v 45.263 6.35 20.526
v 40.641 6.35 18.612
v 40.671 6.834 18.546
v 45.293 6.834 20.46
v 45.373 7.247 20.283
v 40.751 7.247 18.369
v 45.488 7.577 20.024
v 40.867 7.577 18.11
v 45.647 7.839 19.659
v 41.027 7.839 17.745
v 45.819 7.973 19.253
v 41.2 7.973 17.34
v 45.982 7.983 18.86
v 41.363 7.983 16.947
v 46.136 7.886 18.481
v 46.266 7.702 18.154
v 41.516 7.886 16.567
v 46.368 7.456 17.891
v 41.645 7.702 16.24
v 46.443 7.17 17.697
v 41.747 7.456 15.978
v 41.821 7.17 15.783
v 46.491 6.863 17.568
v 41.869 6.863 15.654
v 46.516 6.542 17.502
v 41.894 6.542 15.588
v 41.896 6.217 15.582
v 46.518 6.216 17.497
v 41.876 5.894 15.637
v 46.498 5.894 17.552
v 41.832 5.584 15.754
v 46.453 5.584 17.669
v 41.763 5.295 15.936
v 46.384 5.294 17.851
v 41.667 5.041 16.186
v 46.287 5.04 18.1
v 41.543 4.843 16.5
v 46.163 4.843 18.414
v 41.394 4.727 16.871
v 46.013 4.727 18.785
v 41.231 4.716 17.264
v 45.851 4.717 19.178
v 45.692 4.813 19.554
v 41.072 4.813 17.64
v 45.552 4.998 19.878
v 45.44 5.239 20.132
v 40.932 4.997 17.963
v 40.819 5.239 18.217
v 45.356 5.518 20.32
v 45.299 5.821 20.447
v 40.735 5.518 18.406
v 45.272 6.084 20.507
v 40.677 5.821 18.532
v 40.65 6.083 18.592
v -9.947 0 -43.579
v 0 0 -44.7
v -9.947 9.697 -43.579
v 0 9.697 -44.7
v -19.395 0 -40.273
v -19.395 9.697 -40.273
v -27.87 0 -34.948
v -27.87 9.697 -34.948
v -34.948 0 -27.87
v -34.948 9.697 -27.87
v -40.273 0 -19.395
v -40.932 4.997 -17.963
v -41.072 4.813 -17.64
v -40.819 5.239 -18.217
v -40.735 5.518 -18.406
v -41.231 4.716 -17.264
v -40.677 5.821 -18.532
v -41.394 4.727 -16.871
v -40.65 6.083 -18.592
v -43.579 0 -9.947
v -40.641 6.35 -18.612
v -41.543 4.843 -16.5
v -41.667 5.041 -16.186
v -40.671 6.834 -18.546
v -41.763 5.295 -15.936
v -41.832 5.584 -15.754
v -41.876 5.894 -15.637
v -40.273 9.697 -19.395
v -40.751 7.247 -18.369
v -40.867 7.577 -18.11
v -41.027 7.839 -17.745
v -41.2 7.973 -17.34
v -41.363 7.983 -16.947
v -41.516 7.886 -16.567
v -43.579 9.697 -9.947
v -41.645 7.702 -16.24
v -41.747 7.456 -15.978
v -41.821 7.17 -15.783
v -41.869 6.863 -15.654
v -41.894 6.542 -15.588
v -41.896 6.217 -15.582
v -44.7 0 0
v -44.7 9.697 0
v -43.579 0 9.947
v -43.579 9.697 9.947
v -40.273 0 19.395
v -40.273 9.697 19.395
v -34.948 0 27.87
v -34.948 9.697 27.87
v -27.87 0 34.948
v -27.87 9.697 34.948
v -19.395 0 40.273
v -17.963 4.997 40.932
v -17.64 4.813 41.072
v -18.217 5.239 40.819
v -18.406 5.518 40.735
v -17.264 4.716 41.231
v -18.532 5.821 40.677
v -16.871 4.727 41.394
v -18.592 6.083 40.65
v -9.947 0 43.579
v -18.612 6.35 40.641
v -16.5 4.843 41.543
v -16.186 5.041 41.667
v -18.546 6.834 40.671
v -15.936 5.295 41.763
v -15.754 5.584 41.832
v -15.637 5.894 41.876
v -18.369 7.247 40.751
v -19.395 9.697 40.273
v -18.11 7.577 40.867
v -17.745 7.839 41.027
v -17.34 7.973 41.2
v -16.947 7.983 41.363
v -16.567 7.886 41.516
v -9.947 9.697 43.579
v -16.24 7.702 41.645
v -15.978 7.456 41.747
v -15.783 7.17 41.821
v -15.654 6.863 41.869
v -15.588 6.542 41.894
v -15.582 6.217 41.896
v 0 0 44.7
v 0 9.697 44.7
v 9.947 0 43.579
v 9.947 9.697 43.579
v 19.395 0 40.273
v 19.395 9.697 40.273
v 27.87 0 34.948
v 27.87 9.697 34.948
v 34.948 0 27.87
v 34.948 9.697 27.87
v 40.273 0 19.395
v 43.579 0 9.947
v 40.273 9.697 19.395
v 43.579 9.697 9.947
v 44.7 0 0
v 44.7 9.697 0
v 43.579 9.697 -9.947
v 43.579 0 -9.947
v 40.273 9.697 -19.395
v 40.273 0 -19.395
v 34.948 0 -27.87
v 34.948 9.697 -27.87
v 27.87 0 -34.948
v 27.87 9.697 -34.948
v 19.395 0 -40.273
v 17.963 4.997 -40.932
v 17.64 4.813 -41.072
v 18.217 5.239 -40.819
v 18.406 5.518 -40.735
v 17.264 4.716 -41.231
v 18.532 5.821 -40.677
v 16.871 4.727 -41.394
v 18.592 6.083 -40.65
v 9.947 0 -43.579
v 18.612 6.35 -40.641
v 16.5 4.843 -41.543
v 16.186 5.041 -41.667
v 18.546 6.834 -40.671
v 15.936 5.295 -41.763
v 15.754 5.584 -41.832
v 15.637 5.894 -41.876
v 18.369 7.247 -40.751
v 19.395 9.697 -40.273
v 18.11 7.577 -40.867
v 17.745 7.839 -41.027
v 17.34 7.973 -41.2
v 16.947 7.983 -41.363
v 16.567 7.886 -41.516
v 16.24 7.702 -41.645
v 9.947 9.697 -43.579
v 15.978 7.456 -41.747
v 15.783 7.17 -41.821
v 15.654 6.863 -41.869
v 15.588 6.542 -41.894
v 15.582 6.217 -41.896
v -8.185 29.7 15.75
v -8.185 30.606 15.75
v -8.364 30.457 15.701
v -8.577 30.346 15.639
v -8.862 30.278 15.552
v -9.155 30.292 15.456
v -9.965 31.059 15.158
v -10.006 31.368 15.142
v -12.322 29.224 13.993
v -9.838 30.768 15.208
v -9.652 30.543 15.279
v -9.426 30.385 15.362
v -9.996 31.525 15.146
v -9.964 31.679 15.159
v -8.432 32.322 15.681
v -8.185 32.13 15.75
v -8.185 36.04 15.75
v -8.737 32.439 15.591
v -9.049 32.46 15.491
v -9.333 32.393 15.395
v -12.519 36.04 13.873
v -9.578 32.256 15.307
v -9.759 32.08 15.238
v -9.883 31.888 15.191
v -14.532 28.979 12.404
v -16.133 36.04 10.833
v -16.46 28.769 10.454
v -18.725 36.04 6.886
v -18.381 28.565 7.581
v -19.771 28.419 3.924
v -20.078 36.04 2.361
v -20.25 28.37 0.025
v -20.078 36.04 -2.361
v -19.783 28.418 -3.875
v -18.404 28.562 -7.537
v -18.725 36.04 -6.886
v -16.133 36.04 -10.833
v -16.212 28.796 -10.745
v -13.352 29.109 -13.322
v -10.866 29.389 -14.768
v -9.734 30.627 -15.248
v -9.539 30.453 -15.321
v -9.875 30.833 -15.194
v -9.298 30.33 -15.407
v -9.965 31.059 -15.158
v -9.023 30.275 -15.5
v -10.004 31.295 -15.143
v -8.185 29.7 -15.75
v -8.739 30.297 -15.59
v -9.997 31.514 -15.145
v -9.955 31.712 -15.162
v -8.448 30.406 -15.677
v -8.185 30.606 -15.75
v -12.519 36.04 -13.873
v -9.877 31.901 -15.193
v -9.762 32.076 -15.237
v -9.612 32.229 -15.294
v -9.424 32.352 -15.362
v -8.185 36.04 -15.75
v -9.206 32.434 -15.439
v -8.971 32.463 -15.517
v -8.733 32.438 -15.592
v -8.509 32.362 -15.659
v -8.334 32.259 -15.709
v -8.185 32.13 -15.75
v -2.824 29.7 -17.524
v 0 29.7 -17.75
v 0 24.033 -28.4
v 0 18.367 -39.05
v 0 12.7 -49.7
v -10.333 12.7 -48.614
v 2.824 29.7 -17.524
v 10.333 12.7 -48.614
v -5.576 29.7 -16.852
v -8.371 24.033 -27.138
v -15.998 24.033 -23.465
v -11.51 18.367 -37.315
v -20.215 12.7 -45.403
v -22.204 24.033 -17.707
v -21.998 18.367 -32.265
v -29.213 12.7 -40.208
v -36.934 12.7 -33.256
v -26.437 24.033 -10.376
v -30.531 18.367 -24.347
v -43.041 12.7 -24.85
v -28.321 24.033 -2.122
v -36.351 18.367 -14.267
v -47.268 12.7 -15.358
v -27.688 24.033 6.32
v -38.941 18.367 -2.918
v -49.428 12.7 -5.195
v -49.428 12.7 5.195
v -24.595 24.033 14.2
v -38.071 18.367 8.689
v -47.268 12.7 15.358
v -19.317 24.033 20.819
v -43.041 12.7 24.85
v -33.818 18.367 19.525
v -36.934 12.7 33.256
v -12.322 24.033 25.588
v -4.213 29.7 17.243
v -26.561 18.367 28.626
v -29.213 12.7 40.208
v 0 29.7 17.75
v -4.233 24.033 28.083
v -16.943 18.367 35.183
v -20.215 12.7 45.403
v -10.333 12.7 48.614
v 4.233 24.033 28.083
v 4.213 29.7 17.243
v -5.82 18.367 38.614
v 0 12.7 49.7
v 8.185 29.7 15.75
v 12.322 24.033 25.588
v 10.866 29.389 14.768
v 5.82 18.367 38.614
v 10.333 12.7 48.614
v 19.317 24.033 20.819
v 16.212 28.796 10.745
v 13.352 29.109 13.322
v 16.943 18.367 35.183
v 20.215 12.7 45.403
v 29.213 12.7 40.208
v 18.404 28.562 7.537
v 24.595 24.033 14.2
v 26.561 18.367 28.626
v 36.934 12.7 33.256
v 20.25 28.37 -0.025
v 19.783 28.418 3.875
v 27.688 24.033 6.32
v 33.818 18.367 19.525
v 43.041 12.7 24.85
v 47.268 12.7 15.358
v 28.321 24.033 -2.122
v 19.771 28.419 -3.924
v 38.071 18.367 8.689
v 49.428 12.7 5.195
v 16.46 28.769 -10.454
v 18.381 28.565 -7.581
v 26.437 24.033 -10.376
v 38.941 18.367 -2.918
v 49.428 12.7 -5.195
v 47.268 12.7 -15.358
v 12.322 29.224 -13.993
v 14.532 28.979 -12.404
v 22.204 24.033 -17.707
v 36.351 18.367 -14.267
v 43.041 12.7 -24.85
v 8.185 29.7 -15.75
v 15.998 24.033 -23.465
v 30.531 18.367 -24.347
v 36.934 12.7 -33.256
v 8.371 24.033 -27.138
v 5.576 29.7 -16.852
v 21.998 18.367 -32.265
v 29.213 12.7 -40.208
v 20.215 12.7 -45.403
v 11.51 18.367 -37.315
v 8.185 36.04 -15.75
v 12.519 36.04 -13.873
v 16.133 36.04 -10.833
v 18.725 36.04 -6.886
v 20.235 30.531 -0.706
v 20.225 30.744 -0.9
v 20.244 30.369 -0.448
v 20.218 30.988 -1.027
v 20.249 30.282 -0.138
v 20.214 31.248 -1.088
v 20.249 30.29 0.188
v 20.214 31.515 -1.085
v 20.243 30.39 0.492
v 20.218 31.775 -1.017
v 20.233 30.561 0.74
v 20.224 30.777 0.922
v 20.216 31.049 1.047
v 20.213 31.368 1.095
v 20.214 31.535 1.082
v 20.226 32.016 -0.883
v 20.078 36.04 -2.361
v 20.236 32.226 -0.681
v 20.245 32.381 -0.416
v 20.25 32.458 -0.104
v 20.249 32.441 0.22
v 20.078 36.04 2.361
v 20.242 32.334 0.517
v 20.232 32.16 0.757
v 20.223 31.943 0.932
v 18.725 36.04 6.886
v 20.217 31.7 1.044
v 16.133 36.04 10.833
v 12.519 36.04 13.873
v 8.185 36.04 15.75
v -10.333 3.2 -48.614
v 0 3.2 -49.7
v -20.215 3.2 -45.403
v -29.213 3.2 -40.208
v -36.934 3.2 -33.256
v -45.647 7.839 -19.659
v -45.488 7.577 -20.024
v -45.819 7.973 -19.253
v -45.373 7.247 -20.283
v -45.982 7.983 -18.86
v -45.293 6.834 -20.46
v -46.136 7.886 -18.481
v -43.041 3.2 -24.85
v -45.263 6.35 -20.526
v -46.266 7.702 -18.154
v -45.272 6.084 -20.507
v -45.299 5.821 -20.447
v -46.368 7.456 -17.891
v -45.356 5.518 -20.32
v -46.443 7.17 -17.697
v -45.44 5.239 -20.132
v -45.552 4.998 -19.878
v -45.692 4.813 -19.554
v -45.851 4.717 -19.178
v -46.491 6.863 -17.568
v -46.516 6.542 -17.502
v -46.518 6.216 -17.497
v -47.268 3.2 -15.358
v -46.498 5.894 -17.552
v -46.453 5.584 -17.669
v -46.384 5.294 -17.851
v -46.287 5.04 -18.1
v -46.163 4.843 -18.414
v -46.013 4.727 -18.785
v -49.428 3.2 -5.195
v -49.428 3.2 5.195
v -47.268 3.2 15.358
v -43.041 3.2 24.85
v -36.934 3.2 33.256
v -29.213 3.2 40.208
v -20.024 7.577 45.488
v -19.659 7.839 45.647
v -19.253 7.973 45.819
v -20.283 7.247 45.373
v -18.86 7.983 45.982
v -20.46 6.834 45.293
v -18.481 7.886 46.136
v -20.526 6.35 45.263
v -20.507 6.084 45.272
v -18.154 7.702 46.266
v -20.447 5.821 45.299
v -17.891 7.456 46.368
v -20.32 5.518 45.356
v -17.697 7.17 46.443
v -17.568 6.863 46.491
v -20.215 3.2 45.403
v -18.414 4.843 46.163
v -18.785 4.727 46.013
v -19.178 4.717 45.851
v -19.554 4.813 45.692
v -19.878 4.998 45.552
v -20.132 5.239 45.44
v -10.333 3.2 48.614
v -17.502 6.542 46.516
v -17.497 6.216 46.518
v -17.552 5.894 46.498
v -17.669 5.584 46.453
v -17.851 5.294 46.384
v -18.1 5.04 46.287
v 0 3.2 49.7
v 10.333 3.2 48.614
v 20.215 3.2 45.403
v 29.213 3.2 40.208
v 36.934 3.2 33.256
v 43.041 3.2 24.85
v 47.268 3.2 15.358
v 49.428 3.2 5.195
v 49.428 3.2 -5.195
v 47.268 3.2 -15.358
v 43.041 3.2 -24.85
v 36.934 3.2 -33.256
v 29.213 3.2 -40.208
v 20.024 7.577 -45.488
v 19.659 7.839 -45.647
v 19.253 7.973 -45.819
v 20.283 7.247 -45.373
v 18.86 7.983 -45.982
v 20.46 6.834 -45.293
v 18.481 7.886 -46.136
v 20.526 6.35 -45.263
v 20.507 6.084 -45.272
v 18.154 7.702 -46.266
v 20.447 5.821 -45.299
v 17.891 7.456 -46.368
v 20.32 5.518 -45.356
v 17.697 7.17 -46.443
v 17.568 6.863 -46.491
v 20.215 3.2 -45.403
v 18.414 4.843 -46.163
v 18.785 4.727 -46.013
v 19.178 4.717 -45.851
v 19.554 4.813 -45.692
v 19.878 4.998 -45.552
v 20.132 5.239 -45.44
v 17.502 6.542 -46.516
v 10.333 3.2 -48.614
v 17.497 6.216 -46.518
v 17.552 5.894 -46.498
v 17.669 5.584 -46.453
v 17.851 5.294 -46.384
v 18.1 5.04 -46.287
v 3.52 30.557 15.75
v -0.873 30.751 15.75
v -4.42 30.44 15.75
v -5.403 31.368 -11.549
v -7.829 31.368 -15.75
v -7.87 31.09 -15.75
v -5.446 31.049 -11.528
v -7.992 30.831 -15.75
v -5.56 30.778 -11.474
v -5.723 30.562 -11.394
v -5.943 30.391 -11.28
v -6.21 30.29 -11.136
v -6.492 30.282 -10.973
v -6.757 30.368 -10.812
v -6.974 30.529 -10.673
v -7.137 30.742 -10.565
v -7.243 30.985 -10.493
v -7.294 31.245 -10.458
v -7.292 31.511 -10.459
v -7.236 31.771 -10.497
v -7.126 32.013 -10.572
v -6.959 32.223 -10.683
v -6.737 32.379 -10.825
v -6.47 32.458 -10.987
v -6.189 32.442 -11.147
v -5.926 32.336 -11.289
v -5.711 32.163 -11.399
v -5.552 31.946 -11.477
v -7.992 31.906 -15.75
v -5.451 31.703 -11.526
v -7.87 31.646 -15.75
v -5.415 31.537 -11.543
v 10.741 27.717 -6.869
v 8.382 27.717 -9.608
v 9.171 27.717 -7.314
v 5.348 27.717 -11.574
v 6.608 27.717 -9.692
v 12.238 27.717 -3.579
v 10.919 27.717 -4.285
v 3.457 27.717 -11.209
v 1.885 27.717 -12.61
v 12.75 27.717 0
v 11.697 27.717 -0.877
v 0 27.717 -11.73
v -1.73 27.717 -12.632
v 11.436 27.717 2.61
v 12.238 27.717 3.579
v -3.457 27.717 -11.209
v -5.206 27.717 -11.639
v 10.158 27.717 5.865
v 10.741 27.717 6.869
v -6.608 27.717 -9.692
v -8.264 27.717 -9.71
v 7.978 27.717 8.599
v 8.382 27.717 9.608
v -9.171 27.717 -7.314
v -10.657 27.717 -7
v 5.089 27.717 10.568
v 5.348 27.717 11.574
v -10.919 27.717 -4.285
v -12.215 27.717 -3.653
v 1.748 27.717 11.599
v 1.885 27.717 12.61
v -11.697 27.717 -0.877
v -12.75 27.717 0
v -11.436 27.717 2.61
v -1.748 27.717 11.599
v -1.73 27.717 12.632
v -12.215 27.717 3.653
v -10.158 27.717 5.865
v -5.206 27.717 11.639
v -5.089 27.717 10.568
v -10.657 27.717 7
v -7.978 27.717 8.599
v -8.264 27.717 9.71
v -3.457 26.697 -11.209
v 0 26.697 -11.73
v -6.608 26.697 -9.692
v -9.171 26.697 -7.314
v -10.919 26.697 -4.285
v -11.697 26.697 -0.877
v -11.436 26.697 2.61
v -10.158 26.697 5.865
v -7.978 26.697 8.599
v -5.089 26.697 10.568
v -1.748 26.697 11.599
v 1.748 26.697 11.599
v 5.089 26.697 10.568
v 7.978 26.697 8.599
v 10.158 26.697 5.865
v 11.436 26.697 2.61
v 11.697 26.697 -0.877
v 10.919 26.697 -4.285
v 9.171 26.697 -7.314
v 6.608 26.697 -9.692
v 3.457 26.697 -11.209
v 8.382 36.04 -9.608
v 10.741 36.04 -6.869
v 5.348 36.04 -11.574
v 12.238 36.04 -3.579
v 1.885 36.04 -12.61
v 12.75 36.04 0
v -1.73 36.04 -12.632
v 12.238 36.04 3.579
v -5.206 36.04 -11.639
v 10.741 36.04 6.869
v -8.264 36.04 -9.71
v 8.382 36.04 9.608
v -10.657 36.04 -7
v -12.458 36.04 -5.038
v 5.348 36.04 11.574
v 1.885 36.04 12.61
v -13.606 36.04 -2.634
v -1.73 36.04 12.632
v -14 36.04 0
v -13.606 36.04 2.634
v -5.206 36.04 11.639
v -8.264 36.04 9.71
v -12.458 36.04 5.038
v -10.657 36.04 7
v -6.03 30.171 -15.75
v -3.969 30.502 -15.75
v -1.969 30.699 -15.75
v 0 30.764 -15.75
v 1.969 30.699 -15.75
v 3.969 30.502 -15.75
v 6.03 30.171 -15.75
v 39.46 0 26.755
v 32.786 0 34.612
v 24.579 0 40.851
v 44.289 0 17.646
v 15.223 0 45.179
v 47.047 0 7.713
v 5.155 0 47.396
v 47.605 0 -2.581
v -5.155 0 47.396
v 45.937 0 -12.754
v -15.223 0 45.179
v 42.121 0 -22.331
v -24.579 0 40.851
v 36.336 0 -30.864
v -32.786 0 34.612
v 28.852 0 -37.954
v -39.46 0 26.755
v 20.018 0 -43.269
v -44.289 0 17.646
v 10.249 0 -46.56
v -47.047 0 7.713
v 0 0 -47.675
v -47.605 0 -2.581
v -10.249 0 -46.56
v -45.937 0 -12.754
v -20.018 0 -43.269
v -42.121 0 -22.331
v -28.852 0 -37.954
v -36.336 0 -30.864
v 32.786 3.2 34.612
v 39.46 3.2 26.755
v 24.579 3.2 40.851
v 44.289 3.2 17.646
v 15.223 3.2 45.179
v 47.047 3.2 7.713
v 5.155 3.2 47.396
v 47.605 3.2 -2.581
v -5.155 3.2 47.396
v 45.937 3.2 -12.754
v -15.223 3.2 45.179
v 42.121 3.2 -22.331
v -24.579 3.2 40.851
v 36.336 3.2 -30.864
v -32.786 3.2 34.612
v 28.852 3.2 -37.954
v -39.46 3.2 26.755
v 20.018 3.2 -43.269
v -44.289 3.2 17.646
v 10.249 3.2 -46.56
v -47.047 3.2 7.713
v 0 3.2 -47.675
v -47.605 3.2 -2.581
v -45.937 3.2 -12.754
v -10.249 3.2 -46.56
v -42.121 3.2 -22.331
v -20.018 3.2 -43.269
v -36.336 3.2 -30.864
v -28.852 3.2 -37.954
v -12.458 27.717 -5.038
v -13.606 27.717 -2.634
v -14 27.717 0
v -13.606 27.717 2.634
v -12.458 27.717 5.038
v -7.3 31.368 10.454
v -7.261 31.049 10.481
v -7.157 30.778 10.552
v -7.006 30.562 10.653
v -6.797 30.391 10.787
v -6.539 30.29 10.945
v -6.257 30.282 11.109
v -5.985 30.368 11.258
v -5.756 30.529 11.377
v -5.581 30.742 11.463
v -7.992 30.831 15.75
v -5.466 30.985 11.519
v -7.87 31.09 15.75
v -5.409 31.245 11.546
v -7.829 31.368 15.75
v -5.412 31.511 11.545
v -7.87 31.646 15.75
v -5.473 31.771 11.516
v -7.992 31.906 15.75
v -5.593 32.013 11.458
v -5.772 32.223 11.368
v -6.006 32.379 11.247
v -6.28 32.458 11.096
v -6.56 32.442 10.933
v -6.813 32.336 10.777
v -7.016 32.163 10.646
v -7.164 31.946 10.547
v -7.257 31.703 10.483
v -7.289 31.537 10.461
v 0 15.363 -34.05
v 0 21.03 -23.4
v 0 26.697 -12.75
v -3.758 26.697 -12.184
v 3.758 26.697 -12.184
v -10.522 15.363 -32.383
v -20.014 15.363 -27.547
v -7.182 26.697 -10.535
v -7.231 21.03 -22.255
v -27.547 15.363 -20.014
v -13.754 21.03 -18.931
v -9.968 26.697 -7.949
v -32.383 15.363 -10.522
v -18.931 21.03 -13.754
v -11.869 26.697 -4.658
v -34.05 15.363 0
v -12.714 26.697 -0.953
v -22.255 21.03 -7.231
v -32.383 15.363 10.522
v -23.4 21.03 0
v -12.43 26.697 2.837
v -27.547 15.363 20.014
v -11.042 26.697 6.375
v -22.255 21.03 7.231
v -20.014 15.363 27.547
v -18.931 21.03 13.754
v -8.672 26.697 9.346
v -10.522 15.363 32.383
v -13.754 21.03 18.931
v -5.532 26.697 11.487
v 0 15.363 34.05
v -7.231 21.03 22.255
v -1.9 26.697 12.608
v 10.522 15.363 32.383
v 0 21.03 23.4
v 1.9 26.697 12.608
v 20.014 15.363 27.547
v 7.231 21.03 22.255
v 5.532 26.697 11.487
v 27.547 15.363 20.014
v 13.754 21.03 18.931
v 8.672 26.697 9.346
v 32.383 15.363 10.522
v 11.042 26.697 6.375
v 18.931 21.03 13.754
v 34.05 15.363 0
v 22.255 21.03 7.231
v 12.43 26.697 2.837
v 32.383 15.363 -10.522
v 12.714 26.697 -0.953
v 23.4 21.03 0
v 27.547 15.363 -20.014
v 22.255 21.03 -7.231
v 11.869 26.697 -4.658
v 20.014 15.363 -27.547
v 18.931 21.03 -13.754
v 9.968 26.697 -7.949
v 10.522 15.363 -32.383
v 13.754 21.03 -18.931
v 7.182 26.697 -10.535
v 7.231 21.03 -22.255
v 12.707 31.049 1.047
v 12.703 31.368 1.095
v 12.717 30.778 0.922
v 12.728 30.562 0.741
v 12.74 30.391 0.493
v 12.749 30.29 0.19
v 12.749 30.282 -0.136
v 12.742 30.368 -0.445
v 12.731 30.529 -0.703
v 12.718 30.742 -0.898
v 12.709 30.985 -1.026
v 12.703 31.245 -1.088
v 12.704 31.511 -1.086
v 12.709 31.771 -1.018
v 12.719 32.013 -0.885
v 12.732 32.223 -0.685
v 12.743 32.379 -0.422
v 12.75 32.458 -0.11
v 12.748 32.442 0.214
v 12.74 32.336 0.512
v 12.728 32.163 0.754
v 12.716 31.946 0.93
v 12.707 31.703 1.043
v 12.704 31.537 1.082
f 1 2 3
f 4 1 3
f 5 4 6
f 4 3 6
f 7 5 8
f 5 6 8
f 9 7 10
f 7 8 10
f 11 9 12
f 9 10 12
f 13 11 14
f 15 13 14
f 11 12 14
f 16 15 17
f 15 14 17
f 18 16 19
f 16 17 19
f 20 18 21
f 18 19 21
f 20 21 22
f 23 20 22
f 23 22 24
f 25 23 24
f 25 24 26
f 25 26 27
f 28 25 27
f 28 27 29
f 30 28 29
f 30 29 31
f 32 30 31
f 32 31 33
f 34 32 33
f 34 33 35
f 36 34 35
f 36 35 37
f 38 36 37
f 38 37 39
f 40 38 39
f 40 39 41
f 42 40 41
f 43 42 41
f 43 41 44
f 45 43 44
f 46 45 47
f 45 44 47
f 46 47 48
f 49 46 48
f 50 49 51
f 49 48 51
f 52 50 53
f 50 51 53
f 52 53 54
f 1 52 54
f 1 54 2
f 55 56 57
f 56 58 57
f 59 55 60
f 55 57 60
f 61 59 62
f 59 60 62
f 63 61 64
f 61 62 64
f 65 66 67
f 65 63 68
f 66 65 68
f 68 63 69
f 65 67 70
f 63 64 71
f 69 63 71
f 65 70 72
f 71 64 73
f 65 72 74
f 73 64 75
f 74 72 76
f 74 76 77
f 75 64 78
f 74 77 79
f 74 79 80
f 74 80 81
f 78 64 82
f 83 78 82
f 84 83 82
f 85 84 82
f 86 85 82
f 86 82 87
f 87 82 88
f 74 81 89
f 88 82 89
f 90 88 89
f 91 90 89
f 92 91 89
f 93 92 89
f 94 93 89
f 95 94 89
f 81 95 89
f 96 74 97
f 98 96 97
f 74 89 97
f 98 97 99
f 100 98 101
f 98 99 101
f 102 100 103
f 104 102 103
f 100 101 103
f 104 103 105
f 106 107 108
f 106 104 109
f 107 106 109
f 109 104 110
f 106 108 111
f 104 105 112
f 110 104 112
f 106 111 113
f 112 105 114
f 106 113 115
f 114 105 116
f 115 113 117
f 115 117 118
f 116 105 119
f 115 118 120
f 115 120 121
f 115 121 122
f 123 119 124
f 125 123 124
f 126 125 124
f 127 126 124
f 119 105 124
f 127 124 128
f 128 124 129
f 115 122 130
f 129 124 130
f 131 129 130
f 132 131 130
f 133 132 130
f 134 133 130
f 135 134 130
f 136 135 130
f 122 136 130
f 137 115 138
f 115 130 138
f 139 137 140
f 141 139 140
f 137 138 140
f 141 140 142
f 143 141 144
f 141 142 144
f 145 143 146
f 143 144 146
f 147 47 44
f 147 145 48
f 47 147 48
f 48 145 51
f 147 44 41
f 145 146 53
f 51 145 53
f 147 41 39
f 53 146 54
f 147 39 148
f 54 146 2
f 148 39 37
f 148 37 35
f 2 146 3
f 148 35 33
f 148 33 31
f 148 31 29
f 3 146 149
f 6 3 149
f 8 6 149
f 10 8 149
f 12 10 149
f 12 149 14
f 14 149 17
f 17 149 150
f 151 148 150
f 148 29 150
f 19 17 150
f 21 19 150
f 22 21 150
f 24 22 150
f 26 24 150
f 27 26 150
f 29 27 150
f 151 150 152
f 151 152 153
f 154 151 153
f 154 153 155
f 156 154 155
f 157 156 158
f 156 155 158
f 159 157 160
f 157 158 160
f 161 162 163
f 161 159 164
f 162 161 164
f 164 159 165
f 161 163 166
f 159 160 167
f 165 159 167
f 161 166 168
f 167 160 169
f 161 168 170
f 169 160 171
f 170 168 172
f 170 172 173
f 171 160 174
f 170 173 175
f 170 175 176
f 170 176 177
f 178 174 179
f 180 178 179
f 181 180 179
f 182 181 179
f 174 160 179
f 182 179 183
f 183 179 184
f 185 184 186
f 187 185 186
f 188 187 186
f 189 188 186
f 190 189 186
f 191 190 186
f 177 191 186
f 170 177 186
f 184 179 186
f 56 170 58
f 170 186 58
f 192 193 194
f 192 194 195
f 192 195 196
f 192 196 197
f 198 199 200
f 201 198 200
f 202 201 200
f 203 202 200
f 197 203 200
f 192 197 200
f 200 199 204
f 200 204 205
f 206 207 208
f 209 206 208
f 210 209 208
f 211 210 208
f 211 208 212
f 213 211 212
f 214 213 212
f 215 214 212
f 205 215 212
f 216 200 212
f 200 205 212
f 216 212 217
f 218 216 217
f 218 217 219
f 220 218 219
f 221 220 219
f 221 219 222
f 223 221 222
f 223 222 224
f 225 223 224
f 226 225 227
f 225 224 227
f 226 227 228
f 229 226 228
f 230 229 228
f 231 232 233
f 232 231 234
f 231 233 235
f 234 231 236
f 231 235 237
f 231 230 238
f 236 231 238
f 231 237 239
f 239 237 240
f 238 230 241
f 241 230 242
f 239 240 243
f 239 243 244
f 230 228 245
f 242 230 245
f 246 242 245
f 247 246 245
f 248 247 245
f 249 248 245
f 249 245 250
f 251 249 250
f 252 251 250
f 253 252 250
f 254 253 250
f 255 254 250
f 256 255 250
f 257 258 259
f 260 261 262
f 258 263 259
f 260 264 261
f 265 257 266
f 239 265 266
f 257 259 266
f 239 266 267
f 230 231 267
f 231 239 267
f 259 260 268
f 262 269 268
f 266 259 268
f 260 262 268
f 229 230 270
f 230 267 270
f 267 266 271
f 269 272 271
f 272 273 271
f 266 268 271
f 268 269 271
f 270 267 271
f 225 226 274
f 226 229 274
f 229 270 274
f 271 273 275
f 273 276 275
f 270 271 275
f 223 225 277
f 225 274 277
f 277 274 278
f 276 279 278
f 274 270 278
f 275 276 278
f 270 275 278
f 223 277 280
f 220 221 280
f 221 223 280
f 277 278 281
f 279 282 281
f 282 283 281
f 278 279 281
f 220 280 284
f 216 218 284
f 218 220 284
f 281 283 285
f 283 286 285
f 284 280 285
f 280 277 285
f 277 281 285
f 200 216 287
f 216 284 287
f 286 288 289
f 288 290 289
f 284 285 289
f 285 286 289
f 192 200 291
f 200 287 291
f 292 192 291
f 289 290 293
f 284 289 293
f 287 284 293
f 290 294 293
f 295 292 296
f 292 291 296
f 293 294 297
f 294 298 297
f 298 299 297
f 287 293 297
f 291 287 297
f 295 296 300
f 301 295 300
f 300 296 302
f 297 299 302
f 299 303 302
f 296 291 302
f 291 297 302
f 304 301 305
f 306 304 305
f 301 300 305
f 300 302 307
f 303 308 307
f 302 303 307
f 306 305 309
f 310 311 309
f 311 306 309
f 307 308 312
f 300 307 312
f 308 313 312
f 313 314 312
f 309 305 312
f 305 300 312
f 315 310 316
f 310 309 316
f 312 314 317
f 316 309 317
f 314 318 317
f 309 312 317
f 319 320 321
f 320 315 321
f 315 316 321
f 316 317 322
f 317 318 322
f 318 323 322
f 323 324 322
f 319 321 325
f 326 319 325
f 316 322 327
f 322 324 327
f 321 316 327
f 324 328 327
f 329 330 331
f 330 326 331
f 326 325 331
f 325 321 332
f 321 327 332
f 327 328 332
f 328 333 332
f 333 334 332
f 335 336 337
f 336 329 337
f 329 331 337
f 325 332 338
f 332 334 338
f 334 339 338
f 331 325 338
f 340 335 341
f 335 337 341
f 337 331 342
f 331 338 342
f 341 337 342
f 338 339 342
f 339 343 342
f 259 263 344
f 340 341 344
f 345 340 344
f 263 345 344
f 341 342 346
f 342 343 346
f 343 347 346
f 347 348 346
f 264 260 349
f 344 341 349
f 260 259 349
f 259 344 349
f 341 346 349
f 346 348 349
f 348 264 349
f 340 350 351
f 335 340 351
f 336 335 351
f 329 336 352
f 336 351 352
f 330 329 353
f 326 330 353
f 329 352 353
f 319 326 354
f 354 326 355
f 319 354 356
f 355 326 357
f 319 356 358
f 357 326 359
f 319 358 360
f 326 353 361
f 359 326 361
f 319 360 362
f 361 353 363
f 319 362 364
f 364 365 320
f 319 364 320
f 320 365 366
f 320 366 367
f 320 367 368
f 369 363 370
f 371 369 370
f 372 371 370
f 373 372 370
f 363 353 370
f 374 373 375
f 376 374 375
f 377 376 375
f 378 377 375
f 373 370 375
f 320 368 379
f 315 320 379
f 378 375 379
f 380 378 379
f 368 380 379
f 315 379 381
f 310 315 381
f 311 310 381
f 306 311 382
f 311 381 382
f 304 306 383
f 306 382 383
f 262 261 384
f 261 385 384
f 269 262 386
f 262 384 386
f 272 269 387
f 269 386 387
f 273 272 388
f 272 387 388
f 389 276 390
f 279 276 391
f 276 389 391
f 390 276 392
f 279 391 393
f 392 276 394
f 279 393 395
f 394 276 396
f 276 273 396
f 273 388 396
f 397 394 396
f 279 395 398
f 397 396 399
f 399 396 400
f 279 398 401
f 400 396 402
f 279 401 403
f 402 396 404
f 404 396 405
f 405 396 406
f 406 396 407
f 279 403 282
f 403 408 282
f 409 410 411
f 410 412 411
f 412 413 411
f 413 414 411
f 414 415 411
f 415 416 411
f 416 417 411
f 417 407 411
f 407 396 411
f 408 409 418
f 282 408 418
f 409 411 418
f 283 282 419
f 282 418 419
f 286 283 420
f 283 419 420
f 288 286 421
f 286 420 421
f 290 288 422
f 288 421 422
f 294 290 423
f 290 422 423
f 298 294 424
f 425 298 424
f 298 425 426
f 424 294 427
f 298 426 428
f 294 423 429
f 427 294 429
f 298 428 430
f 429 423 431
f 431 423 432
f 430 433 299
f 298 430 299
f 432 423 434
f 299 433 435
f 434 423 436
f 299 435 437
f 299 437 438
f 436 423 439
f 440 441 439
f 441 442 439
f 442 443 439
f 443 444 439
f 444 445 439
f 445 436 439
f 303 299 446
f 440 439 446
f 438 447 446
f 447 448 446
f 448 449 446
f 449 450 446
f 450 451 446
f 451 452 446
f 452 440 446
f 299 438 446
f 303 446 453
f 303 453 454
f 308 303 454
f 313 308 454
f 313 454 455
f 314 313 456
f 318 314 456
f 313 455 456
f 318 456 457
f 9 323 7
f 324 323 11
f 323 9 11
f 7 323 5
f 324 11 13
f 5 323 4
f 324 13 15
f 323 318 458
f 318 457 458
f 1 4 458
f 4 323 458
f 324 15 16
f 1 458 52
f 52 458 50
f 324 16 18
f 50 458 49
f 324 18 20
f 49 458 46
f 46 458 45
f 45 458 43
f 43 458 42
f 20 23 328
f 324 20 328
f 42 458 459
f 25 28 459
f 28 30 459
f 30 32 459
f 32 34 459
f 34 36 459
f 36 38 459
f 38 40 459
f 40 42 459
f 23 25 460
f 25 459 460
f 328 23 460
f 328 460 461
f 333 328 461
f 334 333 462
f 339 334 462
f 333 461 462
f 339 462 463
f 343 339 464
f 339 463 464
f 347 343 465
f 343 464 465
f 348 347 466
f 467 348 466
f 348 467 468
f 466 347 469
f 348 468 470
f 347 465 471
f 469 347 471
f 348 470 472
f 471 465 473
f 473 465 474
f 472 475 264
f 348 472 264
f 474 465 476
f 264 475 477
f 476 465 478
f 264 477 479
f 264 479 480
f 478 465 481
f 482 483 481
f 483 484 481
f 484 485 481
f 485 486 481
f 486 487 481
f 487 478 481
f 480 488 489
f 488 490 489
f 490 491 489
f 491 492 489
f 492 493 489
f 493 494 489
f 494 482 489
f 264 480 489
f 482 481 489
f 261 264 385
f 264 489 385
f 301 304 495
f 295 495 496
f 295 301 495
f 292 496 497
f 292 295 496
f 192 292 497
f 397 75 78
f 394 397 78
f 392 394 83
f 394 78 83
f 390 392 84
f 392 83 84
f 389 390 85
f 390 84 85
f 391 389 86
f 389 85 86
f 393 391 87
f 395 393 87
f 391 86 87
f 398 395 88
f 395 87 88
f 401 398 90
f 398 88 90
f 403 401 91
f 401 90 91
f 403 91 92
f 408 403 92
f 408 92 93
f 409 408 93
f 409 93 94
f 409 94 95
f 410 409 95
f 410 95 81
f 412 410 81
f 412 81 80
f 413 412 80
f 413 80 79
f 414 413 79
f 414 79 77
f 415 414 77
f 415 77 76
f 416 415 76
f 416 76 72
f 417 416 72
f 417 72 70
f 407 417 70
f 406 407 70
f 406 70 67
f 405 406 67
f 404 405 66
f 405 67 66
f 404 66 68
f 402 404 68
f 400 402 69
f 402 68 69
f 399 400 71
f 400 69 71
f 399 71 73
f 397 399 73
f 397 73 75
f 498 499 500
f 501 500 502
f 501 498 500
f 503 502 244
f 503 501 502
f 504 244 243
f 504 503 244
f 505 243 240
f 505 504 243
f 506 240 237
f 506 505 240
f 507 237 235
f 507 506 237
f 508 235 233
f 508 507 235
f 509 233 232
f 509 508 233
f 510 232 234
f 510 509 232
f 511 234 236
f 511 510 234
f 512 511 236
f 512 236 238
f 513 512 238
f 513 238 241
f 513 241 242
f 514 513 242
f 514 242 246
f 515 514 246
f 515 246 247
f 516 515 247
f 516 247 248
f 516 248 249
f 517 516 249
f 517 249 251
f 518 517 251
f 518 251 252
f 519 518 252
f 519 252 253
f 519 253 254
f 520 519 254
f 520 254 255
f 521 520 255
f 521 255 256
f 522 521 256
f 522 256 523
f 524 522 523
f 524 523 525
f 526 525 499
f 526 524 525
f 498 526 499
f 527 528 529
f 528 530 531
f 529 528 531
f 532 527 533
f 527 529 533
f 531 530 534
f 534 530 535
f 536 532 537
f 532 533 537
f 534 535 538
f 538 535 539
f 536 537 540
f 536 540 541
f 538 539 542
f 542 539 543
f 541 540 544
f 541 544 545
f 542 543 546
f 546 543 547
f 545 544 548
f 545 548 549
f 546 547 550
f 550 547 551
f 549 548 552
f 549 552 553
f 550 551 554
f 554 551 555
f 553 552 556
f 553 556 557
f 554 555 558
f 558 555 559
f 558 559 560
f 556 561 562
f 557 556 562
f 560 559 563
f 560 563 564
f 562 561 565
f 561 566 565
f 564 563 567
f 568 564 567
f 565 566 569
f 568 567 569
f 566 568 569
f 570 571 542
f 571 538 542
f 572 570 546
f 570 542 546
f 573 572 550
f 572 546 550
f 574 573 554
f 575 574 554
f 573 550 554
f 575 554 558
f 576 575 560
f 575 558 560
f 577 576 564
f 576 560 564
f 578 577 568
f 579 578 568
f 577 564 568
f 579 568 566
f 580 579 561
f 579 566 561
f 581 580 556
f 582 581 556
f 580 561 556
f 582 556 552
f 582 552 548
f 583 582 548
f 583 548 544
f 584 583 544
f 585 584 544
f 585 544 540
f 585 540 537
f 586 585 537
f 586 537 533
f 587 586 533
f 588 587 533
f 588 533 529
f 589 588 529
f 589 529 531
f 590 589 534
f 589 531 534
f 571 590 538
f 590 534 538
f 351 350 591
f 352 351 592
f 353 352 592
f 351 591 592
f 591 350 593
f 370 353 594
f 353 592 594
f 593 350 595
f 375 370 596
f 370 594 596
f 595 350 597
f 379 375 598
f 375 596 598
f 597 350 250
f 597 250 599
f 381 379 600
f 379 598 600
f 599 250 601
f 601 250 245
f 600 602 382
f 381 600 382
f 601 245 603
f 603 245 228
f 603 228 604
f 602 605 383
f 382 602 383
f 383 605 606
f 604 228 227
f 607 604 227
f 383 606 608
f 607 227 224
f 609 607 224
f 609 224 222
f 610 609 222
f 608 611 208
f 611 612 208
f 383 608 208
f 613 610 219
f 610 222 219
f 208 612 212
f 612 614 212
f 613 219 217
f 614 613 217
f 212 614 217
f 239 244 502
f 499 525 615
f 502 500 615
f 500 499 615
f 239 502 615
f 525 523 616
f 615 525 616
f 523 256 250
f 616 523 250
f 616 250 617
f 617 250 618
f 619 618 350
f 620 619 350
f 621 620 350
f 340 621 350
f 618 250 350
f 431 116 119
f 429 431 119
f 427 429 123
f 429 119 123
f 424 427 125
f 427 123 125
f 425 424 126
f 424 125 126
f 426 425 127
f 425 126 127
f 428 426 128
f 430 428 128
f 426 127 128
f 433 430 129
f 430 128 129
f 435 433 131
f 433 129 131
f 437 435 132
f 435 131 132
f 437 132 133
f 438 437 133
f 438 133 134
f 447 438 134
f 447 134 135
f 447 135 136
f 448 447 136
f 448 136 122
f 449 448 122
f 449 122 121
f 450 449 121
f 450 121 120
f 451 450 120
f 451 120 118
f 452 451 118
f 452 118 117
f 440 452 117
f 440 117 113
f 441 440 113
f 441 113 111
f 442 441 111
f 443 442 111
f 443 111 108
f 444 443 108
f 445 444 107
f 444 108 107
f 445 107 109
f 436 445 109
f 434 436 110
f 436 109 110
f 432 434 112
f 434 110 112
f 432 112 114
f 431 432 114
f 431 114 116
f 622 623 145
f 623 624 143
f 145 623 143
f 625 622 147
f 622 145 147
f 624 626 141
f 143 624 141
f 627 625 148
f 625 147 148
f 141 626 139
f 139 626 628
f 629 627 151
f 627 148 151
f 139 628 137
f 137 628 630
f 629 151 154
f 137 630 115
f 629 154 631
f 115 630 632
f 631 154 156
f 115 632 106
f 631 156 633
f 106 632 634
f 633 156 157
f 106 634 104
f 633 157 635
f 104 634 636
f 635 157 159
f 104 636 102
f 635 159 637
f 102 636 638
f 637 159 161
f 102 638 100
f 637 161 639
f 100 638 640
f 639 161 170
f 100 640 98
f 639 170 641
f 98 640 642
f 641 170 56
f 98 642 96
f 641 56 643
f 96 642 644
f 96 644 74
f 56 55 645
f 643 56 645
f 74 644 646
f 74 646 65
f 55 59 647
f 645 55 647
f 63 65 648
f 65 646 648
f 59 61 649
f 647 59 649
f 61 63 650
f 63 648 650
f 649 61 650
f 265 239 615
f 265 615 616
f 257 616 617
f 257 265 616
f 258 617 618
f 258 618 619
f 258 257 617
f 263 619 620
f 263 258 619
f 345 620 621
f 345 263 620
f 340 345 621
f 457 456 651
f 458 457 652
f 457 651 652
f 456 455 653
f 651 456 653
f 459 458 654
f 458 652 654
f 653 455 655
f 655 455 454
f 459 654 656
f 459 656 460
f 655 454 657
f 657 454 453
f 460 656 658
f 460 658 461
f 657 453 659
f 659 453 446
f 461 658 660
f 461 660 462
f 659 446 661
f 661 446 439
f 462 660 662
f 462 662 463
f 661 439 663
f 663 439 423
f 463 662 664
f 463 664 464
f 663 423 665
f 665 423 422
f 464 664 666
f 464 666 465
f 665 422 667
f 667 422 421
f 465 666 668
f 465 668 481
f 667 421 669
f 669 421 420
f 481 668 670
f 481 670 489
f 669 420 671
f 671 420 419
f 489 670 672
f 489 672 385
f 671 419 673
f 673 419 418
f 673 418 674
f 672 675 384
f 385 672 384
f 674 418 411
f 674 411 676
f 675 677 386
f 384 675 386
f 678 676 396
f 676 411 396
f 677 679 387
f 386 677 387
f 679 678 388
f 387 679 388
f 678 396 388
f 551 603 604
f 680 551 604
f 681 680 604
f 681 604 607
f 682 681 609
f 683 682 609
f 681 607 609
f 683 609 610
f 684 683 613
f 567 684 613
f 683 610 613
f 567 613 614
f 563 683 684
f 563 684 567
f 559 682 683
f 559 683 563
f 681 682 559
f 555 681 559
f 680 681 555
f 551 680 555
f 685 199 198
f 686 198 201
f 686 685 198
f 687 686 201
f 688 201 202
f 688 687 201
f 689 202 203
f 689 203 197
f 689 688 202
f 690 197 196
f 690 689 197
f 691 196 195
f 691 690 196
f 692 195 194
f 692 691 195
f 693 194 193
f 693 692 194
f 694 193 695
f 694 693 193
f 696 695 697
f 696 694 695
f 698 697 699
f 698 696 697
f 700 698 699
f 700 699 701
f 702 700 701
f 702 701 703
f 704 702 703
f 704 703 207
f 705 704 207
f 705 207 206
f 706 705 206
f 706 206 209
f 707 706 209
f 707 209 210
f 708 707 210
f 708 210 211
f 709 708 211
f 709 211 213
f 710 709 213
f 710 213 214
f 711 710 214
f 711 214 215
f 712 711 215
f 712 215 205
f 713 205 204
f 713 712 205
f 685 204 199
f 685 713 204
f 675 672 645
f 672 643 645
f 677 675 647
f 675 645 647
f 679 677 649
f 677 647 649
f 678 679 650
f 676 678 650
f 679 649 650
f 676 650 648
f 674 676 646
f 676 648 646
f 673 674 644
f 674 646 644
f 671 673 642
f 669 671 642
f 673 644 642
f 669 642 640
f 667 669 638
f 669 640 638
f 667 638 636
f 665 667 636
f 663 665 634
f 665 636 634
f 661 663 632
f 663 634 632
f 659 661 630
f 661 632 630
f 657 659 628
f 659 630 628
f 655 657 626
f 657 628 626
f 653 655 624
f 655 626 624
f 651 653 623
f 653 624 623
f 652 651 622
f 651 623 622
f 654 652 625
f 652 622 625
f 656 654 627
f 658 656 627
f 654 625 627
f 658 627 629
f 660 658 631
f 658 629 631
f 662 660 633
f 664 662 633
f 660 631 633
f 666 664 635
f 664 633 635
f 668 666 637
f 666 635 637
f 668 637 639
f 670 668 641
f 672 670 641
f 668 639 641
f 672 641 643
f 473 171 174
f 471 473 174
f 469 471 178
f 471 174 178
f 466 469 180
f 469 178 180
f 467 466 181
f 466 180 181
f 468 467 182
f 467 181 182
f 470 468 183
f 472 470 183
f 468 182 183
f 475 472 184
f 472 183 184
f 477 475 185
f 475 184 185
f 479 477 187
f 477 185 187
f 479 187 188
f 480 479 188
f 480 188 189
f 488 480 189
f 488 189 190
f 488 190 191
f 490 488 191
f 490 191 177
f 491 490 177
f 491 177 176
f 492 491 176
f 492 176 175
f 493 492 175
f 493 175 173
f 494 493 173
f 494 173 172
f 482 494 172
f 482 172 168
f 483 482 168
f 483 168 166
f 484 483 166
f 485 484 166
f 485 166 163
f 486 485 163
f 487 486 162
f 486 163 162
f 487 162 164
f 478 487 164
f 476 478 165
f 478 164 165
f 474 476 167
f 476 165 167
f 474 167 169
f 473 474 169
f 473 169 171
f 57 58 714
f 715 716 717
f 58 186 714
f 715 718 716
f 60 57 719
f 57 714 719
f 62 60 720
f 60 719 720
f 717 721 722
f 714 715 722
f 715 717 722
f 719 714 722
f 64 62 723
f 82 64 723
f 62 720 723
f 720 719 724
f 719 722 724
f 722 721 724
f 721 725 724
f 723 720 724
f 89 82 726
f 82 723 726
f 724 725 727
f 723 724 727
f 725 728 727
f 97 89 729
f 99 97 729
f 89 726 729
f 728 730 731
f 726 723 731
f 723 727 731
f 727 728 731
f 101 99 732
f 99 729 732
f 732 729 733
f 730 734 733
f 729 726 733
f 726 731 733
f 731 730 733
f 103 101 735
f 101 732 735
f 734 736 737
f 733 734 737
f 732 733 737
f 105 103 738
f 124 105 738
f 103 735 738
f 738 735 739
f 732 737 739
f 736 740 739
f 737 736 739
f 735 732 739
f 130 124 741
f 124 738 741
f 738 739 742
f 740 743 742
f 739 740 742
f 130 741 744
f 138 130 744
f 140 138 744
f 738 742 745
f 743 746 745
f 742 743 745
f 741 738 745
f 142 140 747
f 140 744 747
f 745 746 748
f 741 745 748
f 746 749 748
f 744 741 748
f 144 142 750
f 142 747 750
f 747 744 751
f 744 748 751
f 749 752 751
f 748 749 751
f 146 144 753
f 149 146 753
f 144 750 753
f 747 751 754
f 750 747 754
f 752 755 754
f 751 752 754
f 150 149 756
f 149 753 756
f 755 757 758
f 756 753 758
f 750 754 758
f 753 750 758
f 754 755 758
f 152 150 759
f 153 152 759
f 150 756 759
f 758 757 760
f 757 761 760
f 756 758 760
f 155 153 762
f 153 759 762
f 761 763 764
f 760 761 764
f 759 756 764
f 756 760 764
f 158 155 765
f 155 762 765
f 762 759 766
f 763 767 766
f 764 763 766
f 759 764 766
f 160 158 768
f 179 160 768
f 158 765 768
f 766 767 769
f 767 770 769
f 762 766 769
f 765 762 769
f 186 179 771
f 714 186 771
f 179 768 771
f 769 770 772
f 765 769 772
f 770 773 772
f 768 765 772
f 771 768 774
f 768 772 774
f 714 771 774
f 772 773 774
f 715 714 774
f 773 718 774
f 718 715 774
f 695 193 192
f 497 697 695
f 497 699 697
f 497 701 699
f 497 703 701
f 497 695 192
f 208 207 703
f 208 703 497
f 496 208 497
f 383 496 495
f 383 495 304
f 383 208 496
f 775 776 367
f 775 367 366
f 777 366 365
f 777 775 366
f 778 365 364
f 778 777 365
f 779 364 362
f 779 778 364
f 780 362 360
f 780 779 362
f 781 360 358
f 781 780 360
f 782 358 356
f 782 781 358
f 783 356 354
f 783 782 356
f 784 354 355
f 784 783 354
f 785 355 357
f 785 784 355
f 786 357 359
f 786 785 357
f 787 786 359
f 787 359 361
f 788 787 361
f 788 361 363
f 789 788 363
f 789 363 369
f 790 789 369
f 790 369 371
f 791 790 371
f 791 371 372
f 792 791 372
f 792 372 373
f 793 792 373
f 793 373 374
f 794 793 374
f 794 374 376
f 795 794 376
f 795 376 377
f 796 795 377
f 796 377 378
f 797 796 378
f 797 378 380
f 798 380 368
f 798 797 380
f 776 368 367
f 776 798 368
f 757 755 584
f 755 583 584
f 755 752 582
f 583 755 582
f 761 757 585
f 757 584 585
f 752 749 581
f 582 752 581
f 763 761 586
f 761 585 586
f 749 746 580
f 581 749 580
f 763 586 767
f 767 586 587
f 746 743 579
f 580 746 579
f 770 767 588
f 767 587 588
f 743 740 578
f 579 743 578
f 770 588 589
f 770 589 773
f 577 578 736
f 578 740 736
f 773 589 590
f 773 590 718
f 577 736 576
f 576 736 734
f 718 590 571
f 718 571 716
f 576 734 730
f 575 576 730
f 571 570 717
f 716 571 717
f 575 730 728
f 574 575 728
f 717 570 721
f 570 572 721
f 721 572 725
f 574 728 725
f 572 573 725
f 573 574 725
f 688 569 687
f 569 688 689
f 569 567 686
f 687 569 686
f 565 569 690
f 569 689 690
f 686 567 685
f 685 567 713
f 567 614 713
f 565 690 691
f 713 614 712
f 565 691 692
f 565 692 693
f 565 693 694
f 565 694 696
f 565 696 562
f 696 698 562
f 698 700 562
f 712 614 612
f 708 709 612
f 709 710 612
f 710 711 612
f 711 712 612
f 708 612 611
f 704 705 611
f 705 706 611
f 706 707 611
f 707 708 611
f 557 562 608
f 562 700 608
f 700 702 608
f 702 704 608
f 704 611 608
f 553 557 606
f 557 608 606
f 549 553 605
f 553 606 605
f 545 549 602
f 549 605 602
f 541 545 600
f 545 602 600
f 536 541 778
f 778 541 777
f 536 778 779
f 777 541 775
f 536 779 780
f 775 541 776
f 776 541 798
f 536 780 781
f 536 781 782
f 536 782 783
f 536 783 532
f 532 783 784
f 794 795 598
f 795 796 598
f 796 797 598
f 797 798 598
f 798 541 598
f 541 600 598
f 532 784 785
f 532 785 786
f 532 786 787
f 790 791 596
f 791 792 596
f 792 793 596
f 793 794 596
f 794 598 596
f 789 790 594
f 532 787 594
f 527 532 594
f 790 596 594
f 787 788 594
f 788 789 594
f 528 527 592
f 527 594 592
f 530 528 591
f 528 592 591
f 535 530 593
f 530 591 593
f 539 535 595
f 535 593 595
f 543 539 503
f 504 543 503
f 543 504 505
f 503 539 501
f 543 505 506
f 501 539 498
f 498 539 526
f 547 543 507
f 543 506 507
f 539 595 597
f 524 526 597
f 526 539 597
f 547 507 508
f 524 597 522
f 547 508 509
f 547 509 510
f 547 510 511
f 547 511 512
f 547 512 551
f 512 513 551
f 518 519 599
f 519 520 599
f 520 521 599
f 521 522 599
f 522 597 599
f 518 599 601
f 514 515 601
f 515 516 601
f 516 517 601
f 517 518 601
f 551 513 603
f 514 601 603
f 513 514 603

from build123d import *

# Parameters (mm, degrees)
SKETCH12_R          = 1.6425
CUT_EXTRUDE6_DEPTH  = 65.936179354
CUT_EXTRUDE7_REACH  = 38.04
SKETCH13_W          = 16.370705544
SKETCH13_H          = 2
BOSS_EXTRUDE1_REACH = 38.04
SKETCH14_R          = 12.75
CUT_EXTRUDE8_DEPTH  = 8.323317
SKETCH16_R          = 1.095
CUT_EXTRUDE9_DEPTH  = 50.7000001
CIRPATTERN2_COUNT   = 3
CIRPATTERN3_COUNT   = 4


with BuildPart() as part:
    # Sketch2 → Revolve1 (revolve)
    with BuildSketch(Plane.XY, mode=Mode.PRIVATE) as revolve1_sk:
        Polygon((49.7, 12.7), (49.7, 3.2004), (47.675, 3.2004), (47.675, 0), (44.7, 0), (44.7, 9.696683305), (12.75, 26.696683305), (11.73, 26.696683305), (11.73, 27.716683305), (12.75, 27.716683305), (12.75, 36.04), (17.75, 36.04), (17.75, 29.7), align=None)
    revolve(revolve1_sk.sketch.rotate(Axis((0, 0, 0), (0, 1, 0)), 90), axis=Axis((0, 0, 0), (0, 1, 0)))  # turned: the seam where the file's is

    # Sketch12 → Cut-Extrude6 (cut, through all)
    with BuildSketch(Plane(origin=(0, 0, 0), x_dir=(0.923879533, 0, 0.382683432), z_dir=(-0.382683432, 0, 0.923879533))):
        with Locations((0, 6.35)):
            Circle(SKETCH12_R)
    cut_extrude6 = extrude(amount=-CUT_EXTRUDE6_DEPTH, mode=Mode.SUBTRACT)

    # Cut-Extrude7: up to this cone (the profile starts outside it)
    cut_extrude7_end = Plane(origin=(0, 36.04, 0), z_dir=(0, -1, 0)).offset(-3.104443444) * Cone(1.879e-06, 89.232542042, 47.478972856, align=(Align.CENTER, Align.CENTER, Align.MIN), mode=Mode.PRIVATE)
    # Sketch13 → Cut-Extrude7 (cut, up to the surface)
    with BuildSketch(Plane(origin=(0, 36.04, 0), x_dir=(1, 0, 0), z_dir=(0, 1, 0)), mode=Mode.PRIVATE) as cut_extrude7_sk1:
        with Locations((0, 16.75)):
            Rectangle(SKETCH13_W, SKETCH13_H)
    cut_extrude7_tool1 = extrude(cut_extrude7_sk1.sketch, amount=-CUT_EXTRUDE7_REACH, mode=Mode.PRIVATE) - cut_extrude7_end
    add(cut_extrude7_tool1.solids().sort_by_distance((0, 36.04, -16.75))[0], mode=Mode.SUBTRACT)
    # Sketch13 → Cut-Extrude7 (cut, up to the surface)
    with BuildSketch(Plane(origin=(0, 36.04, 0), x_dir=(1, 0, 0), z_dir=(0, 1, 0)), mode=Mode.PRIVATE) as cut_extrude7_sk2:
        with Locations((0, -16.75)):
            Rectangle(SKETCH13_W, SKETCH13_H)
    cut_extrude7_tool2 = extrude(cut_extrude7_sk2.sketch, amount=-CUT_EXTRUDE7_REACH, mode=Mode.PRIVATE) - cut_extrude7_end
    add(cut_extrude7_tool2.solids().sort_by_distance((0, 36.04, 16.75))[0], mode=Mode.SUBTRACT)

    # Boss-Extrude1: up to this cone (the profile starts outside it)
    boss_extrude1_end = Plane(origin=(0, 36.04, 0), z_dir=(0, -1, 0)).offset(-3.104443444) * Cone(1.879e-06, 89.232542042, 47.478972856, align=(Align.CENTER, Align.CENTER, Align.MIN), mode=Mode.PRIVATE)
    # Sketch14 → Boss-Extrude1 (add, up to the surface)
    with BuildSketch(Plane(origin=(0, 36.04, 0), x_dir=(1, 0, 0), z_dir=(0, 1, 0)), mode=Mode.PRIVATE) as boss_extrude1_sk1:
        with BuildLine():
            Line((-8.185352772, 15.75), (8.185352772, 15.75))
            ThreePointArc((8.185352772, 15.75), (20.25, 0), (8.185352772, -15.75))
            Line((8.185352772, -15.75), (-8.185352772, -15.75))
            ThreePointArc((-8.185352772, -15.75), (-20.25, 0), (-8.185352772, 15.75))
        make_face()
        with Locations(Location((0, 0, 0), (0, 0, 90))):  # turned: the seam where the file's is
            Circle(SKETCH14_R, mode=Mode.SUBTRACT)
    boss_extrude1_tool1 = extrude(boss_extrude1_sk1.sketch, amount=-BOSS_EXTRUDE1_REACH, mode=Mode.PRIVATE) - boss_extrude1_end
    add(boss_extrude1_tool1.solids().sort_by_distance((0, 36.04, 15.236921))[0])

    # Sketch15 → Cut-Extrude8 (cut)
    with BuildSketch(Plane(origin=(0, 36.04, 0), x_dir=(1, 0, 0), z_dir=(0, 1, 0))):
        with BuildLine():
            ThreePointArc((-10.656570743, 7), (-13.999716493, 0), (-10.656570743, -7))
            ThreePointArc((-10.656570743, -7), (-12.75, 0), (-10.656570743, 7))
        make_face()
    extrude(amount=-CUT_EXTRUDE8_DEPTH, mode=Mode.SUBTRACT)

    # Sketch16 → Cut-Extrude9 (cut, through all)
    with BuildSketch(Plane(origin=(0, 0, 0), x_dir=(0, 0, -1), z_dir=(1, 0, 0))):
        with Locations(Location((0, 31.368341653, 0), (0, 0, 180))):  # turned: the seam where the file's is
            Circle(SKETCH16_R)
    cut_extrude9 = extrude(amount=CUT_EXTRUDE9_DEPTH, mode=Mode.SUBTRACT)

    # CirPattern2: Cut-Extrude9 ×3 about axis
    cirpattern2_axis = Axis((0, 13.335, 0), (0, -1, 0))
    for i in range(1, CIRPATTERN2_COUNT):
        add(cut_extrude9.rotate(cirpattern2_axis, i * 360 / CIRPATTERN2_COUNT), mode=Mode.SUBTRACT)

    # CirPattern3: Cut-Extrude6 ×4 about axis
    cirpattern3_axis = Axis((0, 13.335, 0), (0, -1, 0))
    for i in range(1, CIRPATTERN3_COUNT):
        add(cut_extrude6.rotate(cirpattern3_axis, i * 360 / CIRPATTERN3_COUNT), mode=Mode.SUBTRACT)


solid = part.part
